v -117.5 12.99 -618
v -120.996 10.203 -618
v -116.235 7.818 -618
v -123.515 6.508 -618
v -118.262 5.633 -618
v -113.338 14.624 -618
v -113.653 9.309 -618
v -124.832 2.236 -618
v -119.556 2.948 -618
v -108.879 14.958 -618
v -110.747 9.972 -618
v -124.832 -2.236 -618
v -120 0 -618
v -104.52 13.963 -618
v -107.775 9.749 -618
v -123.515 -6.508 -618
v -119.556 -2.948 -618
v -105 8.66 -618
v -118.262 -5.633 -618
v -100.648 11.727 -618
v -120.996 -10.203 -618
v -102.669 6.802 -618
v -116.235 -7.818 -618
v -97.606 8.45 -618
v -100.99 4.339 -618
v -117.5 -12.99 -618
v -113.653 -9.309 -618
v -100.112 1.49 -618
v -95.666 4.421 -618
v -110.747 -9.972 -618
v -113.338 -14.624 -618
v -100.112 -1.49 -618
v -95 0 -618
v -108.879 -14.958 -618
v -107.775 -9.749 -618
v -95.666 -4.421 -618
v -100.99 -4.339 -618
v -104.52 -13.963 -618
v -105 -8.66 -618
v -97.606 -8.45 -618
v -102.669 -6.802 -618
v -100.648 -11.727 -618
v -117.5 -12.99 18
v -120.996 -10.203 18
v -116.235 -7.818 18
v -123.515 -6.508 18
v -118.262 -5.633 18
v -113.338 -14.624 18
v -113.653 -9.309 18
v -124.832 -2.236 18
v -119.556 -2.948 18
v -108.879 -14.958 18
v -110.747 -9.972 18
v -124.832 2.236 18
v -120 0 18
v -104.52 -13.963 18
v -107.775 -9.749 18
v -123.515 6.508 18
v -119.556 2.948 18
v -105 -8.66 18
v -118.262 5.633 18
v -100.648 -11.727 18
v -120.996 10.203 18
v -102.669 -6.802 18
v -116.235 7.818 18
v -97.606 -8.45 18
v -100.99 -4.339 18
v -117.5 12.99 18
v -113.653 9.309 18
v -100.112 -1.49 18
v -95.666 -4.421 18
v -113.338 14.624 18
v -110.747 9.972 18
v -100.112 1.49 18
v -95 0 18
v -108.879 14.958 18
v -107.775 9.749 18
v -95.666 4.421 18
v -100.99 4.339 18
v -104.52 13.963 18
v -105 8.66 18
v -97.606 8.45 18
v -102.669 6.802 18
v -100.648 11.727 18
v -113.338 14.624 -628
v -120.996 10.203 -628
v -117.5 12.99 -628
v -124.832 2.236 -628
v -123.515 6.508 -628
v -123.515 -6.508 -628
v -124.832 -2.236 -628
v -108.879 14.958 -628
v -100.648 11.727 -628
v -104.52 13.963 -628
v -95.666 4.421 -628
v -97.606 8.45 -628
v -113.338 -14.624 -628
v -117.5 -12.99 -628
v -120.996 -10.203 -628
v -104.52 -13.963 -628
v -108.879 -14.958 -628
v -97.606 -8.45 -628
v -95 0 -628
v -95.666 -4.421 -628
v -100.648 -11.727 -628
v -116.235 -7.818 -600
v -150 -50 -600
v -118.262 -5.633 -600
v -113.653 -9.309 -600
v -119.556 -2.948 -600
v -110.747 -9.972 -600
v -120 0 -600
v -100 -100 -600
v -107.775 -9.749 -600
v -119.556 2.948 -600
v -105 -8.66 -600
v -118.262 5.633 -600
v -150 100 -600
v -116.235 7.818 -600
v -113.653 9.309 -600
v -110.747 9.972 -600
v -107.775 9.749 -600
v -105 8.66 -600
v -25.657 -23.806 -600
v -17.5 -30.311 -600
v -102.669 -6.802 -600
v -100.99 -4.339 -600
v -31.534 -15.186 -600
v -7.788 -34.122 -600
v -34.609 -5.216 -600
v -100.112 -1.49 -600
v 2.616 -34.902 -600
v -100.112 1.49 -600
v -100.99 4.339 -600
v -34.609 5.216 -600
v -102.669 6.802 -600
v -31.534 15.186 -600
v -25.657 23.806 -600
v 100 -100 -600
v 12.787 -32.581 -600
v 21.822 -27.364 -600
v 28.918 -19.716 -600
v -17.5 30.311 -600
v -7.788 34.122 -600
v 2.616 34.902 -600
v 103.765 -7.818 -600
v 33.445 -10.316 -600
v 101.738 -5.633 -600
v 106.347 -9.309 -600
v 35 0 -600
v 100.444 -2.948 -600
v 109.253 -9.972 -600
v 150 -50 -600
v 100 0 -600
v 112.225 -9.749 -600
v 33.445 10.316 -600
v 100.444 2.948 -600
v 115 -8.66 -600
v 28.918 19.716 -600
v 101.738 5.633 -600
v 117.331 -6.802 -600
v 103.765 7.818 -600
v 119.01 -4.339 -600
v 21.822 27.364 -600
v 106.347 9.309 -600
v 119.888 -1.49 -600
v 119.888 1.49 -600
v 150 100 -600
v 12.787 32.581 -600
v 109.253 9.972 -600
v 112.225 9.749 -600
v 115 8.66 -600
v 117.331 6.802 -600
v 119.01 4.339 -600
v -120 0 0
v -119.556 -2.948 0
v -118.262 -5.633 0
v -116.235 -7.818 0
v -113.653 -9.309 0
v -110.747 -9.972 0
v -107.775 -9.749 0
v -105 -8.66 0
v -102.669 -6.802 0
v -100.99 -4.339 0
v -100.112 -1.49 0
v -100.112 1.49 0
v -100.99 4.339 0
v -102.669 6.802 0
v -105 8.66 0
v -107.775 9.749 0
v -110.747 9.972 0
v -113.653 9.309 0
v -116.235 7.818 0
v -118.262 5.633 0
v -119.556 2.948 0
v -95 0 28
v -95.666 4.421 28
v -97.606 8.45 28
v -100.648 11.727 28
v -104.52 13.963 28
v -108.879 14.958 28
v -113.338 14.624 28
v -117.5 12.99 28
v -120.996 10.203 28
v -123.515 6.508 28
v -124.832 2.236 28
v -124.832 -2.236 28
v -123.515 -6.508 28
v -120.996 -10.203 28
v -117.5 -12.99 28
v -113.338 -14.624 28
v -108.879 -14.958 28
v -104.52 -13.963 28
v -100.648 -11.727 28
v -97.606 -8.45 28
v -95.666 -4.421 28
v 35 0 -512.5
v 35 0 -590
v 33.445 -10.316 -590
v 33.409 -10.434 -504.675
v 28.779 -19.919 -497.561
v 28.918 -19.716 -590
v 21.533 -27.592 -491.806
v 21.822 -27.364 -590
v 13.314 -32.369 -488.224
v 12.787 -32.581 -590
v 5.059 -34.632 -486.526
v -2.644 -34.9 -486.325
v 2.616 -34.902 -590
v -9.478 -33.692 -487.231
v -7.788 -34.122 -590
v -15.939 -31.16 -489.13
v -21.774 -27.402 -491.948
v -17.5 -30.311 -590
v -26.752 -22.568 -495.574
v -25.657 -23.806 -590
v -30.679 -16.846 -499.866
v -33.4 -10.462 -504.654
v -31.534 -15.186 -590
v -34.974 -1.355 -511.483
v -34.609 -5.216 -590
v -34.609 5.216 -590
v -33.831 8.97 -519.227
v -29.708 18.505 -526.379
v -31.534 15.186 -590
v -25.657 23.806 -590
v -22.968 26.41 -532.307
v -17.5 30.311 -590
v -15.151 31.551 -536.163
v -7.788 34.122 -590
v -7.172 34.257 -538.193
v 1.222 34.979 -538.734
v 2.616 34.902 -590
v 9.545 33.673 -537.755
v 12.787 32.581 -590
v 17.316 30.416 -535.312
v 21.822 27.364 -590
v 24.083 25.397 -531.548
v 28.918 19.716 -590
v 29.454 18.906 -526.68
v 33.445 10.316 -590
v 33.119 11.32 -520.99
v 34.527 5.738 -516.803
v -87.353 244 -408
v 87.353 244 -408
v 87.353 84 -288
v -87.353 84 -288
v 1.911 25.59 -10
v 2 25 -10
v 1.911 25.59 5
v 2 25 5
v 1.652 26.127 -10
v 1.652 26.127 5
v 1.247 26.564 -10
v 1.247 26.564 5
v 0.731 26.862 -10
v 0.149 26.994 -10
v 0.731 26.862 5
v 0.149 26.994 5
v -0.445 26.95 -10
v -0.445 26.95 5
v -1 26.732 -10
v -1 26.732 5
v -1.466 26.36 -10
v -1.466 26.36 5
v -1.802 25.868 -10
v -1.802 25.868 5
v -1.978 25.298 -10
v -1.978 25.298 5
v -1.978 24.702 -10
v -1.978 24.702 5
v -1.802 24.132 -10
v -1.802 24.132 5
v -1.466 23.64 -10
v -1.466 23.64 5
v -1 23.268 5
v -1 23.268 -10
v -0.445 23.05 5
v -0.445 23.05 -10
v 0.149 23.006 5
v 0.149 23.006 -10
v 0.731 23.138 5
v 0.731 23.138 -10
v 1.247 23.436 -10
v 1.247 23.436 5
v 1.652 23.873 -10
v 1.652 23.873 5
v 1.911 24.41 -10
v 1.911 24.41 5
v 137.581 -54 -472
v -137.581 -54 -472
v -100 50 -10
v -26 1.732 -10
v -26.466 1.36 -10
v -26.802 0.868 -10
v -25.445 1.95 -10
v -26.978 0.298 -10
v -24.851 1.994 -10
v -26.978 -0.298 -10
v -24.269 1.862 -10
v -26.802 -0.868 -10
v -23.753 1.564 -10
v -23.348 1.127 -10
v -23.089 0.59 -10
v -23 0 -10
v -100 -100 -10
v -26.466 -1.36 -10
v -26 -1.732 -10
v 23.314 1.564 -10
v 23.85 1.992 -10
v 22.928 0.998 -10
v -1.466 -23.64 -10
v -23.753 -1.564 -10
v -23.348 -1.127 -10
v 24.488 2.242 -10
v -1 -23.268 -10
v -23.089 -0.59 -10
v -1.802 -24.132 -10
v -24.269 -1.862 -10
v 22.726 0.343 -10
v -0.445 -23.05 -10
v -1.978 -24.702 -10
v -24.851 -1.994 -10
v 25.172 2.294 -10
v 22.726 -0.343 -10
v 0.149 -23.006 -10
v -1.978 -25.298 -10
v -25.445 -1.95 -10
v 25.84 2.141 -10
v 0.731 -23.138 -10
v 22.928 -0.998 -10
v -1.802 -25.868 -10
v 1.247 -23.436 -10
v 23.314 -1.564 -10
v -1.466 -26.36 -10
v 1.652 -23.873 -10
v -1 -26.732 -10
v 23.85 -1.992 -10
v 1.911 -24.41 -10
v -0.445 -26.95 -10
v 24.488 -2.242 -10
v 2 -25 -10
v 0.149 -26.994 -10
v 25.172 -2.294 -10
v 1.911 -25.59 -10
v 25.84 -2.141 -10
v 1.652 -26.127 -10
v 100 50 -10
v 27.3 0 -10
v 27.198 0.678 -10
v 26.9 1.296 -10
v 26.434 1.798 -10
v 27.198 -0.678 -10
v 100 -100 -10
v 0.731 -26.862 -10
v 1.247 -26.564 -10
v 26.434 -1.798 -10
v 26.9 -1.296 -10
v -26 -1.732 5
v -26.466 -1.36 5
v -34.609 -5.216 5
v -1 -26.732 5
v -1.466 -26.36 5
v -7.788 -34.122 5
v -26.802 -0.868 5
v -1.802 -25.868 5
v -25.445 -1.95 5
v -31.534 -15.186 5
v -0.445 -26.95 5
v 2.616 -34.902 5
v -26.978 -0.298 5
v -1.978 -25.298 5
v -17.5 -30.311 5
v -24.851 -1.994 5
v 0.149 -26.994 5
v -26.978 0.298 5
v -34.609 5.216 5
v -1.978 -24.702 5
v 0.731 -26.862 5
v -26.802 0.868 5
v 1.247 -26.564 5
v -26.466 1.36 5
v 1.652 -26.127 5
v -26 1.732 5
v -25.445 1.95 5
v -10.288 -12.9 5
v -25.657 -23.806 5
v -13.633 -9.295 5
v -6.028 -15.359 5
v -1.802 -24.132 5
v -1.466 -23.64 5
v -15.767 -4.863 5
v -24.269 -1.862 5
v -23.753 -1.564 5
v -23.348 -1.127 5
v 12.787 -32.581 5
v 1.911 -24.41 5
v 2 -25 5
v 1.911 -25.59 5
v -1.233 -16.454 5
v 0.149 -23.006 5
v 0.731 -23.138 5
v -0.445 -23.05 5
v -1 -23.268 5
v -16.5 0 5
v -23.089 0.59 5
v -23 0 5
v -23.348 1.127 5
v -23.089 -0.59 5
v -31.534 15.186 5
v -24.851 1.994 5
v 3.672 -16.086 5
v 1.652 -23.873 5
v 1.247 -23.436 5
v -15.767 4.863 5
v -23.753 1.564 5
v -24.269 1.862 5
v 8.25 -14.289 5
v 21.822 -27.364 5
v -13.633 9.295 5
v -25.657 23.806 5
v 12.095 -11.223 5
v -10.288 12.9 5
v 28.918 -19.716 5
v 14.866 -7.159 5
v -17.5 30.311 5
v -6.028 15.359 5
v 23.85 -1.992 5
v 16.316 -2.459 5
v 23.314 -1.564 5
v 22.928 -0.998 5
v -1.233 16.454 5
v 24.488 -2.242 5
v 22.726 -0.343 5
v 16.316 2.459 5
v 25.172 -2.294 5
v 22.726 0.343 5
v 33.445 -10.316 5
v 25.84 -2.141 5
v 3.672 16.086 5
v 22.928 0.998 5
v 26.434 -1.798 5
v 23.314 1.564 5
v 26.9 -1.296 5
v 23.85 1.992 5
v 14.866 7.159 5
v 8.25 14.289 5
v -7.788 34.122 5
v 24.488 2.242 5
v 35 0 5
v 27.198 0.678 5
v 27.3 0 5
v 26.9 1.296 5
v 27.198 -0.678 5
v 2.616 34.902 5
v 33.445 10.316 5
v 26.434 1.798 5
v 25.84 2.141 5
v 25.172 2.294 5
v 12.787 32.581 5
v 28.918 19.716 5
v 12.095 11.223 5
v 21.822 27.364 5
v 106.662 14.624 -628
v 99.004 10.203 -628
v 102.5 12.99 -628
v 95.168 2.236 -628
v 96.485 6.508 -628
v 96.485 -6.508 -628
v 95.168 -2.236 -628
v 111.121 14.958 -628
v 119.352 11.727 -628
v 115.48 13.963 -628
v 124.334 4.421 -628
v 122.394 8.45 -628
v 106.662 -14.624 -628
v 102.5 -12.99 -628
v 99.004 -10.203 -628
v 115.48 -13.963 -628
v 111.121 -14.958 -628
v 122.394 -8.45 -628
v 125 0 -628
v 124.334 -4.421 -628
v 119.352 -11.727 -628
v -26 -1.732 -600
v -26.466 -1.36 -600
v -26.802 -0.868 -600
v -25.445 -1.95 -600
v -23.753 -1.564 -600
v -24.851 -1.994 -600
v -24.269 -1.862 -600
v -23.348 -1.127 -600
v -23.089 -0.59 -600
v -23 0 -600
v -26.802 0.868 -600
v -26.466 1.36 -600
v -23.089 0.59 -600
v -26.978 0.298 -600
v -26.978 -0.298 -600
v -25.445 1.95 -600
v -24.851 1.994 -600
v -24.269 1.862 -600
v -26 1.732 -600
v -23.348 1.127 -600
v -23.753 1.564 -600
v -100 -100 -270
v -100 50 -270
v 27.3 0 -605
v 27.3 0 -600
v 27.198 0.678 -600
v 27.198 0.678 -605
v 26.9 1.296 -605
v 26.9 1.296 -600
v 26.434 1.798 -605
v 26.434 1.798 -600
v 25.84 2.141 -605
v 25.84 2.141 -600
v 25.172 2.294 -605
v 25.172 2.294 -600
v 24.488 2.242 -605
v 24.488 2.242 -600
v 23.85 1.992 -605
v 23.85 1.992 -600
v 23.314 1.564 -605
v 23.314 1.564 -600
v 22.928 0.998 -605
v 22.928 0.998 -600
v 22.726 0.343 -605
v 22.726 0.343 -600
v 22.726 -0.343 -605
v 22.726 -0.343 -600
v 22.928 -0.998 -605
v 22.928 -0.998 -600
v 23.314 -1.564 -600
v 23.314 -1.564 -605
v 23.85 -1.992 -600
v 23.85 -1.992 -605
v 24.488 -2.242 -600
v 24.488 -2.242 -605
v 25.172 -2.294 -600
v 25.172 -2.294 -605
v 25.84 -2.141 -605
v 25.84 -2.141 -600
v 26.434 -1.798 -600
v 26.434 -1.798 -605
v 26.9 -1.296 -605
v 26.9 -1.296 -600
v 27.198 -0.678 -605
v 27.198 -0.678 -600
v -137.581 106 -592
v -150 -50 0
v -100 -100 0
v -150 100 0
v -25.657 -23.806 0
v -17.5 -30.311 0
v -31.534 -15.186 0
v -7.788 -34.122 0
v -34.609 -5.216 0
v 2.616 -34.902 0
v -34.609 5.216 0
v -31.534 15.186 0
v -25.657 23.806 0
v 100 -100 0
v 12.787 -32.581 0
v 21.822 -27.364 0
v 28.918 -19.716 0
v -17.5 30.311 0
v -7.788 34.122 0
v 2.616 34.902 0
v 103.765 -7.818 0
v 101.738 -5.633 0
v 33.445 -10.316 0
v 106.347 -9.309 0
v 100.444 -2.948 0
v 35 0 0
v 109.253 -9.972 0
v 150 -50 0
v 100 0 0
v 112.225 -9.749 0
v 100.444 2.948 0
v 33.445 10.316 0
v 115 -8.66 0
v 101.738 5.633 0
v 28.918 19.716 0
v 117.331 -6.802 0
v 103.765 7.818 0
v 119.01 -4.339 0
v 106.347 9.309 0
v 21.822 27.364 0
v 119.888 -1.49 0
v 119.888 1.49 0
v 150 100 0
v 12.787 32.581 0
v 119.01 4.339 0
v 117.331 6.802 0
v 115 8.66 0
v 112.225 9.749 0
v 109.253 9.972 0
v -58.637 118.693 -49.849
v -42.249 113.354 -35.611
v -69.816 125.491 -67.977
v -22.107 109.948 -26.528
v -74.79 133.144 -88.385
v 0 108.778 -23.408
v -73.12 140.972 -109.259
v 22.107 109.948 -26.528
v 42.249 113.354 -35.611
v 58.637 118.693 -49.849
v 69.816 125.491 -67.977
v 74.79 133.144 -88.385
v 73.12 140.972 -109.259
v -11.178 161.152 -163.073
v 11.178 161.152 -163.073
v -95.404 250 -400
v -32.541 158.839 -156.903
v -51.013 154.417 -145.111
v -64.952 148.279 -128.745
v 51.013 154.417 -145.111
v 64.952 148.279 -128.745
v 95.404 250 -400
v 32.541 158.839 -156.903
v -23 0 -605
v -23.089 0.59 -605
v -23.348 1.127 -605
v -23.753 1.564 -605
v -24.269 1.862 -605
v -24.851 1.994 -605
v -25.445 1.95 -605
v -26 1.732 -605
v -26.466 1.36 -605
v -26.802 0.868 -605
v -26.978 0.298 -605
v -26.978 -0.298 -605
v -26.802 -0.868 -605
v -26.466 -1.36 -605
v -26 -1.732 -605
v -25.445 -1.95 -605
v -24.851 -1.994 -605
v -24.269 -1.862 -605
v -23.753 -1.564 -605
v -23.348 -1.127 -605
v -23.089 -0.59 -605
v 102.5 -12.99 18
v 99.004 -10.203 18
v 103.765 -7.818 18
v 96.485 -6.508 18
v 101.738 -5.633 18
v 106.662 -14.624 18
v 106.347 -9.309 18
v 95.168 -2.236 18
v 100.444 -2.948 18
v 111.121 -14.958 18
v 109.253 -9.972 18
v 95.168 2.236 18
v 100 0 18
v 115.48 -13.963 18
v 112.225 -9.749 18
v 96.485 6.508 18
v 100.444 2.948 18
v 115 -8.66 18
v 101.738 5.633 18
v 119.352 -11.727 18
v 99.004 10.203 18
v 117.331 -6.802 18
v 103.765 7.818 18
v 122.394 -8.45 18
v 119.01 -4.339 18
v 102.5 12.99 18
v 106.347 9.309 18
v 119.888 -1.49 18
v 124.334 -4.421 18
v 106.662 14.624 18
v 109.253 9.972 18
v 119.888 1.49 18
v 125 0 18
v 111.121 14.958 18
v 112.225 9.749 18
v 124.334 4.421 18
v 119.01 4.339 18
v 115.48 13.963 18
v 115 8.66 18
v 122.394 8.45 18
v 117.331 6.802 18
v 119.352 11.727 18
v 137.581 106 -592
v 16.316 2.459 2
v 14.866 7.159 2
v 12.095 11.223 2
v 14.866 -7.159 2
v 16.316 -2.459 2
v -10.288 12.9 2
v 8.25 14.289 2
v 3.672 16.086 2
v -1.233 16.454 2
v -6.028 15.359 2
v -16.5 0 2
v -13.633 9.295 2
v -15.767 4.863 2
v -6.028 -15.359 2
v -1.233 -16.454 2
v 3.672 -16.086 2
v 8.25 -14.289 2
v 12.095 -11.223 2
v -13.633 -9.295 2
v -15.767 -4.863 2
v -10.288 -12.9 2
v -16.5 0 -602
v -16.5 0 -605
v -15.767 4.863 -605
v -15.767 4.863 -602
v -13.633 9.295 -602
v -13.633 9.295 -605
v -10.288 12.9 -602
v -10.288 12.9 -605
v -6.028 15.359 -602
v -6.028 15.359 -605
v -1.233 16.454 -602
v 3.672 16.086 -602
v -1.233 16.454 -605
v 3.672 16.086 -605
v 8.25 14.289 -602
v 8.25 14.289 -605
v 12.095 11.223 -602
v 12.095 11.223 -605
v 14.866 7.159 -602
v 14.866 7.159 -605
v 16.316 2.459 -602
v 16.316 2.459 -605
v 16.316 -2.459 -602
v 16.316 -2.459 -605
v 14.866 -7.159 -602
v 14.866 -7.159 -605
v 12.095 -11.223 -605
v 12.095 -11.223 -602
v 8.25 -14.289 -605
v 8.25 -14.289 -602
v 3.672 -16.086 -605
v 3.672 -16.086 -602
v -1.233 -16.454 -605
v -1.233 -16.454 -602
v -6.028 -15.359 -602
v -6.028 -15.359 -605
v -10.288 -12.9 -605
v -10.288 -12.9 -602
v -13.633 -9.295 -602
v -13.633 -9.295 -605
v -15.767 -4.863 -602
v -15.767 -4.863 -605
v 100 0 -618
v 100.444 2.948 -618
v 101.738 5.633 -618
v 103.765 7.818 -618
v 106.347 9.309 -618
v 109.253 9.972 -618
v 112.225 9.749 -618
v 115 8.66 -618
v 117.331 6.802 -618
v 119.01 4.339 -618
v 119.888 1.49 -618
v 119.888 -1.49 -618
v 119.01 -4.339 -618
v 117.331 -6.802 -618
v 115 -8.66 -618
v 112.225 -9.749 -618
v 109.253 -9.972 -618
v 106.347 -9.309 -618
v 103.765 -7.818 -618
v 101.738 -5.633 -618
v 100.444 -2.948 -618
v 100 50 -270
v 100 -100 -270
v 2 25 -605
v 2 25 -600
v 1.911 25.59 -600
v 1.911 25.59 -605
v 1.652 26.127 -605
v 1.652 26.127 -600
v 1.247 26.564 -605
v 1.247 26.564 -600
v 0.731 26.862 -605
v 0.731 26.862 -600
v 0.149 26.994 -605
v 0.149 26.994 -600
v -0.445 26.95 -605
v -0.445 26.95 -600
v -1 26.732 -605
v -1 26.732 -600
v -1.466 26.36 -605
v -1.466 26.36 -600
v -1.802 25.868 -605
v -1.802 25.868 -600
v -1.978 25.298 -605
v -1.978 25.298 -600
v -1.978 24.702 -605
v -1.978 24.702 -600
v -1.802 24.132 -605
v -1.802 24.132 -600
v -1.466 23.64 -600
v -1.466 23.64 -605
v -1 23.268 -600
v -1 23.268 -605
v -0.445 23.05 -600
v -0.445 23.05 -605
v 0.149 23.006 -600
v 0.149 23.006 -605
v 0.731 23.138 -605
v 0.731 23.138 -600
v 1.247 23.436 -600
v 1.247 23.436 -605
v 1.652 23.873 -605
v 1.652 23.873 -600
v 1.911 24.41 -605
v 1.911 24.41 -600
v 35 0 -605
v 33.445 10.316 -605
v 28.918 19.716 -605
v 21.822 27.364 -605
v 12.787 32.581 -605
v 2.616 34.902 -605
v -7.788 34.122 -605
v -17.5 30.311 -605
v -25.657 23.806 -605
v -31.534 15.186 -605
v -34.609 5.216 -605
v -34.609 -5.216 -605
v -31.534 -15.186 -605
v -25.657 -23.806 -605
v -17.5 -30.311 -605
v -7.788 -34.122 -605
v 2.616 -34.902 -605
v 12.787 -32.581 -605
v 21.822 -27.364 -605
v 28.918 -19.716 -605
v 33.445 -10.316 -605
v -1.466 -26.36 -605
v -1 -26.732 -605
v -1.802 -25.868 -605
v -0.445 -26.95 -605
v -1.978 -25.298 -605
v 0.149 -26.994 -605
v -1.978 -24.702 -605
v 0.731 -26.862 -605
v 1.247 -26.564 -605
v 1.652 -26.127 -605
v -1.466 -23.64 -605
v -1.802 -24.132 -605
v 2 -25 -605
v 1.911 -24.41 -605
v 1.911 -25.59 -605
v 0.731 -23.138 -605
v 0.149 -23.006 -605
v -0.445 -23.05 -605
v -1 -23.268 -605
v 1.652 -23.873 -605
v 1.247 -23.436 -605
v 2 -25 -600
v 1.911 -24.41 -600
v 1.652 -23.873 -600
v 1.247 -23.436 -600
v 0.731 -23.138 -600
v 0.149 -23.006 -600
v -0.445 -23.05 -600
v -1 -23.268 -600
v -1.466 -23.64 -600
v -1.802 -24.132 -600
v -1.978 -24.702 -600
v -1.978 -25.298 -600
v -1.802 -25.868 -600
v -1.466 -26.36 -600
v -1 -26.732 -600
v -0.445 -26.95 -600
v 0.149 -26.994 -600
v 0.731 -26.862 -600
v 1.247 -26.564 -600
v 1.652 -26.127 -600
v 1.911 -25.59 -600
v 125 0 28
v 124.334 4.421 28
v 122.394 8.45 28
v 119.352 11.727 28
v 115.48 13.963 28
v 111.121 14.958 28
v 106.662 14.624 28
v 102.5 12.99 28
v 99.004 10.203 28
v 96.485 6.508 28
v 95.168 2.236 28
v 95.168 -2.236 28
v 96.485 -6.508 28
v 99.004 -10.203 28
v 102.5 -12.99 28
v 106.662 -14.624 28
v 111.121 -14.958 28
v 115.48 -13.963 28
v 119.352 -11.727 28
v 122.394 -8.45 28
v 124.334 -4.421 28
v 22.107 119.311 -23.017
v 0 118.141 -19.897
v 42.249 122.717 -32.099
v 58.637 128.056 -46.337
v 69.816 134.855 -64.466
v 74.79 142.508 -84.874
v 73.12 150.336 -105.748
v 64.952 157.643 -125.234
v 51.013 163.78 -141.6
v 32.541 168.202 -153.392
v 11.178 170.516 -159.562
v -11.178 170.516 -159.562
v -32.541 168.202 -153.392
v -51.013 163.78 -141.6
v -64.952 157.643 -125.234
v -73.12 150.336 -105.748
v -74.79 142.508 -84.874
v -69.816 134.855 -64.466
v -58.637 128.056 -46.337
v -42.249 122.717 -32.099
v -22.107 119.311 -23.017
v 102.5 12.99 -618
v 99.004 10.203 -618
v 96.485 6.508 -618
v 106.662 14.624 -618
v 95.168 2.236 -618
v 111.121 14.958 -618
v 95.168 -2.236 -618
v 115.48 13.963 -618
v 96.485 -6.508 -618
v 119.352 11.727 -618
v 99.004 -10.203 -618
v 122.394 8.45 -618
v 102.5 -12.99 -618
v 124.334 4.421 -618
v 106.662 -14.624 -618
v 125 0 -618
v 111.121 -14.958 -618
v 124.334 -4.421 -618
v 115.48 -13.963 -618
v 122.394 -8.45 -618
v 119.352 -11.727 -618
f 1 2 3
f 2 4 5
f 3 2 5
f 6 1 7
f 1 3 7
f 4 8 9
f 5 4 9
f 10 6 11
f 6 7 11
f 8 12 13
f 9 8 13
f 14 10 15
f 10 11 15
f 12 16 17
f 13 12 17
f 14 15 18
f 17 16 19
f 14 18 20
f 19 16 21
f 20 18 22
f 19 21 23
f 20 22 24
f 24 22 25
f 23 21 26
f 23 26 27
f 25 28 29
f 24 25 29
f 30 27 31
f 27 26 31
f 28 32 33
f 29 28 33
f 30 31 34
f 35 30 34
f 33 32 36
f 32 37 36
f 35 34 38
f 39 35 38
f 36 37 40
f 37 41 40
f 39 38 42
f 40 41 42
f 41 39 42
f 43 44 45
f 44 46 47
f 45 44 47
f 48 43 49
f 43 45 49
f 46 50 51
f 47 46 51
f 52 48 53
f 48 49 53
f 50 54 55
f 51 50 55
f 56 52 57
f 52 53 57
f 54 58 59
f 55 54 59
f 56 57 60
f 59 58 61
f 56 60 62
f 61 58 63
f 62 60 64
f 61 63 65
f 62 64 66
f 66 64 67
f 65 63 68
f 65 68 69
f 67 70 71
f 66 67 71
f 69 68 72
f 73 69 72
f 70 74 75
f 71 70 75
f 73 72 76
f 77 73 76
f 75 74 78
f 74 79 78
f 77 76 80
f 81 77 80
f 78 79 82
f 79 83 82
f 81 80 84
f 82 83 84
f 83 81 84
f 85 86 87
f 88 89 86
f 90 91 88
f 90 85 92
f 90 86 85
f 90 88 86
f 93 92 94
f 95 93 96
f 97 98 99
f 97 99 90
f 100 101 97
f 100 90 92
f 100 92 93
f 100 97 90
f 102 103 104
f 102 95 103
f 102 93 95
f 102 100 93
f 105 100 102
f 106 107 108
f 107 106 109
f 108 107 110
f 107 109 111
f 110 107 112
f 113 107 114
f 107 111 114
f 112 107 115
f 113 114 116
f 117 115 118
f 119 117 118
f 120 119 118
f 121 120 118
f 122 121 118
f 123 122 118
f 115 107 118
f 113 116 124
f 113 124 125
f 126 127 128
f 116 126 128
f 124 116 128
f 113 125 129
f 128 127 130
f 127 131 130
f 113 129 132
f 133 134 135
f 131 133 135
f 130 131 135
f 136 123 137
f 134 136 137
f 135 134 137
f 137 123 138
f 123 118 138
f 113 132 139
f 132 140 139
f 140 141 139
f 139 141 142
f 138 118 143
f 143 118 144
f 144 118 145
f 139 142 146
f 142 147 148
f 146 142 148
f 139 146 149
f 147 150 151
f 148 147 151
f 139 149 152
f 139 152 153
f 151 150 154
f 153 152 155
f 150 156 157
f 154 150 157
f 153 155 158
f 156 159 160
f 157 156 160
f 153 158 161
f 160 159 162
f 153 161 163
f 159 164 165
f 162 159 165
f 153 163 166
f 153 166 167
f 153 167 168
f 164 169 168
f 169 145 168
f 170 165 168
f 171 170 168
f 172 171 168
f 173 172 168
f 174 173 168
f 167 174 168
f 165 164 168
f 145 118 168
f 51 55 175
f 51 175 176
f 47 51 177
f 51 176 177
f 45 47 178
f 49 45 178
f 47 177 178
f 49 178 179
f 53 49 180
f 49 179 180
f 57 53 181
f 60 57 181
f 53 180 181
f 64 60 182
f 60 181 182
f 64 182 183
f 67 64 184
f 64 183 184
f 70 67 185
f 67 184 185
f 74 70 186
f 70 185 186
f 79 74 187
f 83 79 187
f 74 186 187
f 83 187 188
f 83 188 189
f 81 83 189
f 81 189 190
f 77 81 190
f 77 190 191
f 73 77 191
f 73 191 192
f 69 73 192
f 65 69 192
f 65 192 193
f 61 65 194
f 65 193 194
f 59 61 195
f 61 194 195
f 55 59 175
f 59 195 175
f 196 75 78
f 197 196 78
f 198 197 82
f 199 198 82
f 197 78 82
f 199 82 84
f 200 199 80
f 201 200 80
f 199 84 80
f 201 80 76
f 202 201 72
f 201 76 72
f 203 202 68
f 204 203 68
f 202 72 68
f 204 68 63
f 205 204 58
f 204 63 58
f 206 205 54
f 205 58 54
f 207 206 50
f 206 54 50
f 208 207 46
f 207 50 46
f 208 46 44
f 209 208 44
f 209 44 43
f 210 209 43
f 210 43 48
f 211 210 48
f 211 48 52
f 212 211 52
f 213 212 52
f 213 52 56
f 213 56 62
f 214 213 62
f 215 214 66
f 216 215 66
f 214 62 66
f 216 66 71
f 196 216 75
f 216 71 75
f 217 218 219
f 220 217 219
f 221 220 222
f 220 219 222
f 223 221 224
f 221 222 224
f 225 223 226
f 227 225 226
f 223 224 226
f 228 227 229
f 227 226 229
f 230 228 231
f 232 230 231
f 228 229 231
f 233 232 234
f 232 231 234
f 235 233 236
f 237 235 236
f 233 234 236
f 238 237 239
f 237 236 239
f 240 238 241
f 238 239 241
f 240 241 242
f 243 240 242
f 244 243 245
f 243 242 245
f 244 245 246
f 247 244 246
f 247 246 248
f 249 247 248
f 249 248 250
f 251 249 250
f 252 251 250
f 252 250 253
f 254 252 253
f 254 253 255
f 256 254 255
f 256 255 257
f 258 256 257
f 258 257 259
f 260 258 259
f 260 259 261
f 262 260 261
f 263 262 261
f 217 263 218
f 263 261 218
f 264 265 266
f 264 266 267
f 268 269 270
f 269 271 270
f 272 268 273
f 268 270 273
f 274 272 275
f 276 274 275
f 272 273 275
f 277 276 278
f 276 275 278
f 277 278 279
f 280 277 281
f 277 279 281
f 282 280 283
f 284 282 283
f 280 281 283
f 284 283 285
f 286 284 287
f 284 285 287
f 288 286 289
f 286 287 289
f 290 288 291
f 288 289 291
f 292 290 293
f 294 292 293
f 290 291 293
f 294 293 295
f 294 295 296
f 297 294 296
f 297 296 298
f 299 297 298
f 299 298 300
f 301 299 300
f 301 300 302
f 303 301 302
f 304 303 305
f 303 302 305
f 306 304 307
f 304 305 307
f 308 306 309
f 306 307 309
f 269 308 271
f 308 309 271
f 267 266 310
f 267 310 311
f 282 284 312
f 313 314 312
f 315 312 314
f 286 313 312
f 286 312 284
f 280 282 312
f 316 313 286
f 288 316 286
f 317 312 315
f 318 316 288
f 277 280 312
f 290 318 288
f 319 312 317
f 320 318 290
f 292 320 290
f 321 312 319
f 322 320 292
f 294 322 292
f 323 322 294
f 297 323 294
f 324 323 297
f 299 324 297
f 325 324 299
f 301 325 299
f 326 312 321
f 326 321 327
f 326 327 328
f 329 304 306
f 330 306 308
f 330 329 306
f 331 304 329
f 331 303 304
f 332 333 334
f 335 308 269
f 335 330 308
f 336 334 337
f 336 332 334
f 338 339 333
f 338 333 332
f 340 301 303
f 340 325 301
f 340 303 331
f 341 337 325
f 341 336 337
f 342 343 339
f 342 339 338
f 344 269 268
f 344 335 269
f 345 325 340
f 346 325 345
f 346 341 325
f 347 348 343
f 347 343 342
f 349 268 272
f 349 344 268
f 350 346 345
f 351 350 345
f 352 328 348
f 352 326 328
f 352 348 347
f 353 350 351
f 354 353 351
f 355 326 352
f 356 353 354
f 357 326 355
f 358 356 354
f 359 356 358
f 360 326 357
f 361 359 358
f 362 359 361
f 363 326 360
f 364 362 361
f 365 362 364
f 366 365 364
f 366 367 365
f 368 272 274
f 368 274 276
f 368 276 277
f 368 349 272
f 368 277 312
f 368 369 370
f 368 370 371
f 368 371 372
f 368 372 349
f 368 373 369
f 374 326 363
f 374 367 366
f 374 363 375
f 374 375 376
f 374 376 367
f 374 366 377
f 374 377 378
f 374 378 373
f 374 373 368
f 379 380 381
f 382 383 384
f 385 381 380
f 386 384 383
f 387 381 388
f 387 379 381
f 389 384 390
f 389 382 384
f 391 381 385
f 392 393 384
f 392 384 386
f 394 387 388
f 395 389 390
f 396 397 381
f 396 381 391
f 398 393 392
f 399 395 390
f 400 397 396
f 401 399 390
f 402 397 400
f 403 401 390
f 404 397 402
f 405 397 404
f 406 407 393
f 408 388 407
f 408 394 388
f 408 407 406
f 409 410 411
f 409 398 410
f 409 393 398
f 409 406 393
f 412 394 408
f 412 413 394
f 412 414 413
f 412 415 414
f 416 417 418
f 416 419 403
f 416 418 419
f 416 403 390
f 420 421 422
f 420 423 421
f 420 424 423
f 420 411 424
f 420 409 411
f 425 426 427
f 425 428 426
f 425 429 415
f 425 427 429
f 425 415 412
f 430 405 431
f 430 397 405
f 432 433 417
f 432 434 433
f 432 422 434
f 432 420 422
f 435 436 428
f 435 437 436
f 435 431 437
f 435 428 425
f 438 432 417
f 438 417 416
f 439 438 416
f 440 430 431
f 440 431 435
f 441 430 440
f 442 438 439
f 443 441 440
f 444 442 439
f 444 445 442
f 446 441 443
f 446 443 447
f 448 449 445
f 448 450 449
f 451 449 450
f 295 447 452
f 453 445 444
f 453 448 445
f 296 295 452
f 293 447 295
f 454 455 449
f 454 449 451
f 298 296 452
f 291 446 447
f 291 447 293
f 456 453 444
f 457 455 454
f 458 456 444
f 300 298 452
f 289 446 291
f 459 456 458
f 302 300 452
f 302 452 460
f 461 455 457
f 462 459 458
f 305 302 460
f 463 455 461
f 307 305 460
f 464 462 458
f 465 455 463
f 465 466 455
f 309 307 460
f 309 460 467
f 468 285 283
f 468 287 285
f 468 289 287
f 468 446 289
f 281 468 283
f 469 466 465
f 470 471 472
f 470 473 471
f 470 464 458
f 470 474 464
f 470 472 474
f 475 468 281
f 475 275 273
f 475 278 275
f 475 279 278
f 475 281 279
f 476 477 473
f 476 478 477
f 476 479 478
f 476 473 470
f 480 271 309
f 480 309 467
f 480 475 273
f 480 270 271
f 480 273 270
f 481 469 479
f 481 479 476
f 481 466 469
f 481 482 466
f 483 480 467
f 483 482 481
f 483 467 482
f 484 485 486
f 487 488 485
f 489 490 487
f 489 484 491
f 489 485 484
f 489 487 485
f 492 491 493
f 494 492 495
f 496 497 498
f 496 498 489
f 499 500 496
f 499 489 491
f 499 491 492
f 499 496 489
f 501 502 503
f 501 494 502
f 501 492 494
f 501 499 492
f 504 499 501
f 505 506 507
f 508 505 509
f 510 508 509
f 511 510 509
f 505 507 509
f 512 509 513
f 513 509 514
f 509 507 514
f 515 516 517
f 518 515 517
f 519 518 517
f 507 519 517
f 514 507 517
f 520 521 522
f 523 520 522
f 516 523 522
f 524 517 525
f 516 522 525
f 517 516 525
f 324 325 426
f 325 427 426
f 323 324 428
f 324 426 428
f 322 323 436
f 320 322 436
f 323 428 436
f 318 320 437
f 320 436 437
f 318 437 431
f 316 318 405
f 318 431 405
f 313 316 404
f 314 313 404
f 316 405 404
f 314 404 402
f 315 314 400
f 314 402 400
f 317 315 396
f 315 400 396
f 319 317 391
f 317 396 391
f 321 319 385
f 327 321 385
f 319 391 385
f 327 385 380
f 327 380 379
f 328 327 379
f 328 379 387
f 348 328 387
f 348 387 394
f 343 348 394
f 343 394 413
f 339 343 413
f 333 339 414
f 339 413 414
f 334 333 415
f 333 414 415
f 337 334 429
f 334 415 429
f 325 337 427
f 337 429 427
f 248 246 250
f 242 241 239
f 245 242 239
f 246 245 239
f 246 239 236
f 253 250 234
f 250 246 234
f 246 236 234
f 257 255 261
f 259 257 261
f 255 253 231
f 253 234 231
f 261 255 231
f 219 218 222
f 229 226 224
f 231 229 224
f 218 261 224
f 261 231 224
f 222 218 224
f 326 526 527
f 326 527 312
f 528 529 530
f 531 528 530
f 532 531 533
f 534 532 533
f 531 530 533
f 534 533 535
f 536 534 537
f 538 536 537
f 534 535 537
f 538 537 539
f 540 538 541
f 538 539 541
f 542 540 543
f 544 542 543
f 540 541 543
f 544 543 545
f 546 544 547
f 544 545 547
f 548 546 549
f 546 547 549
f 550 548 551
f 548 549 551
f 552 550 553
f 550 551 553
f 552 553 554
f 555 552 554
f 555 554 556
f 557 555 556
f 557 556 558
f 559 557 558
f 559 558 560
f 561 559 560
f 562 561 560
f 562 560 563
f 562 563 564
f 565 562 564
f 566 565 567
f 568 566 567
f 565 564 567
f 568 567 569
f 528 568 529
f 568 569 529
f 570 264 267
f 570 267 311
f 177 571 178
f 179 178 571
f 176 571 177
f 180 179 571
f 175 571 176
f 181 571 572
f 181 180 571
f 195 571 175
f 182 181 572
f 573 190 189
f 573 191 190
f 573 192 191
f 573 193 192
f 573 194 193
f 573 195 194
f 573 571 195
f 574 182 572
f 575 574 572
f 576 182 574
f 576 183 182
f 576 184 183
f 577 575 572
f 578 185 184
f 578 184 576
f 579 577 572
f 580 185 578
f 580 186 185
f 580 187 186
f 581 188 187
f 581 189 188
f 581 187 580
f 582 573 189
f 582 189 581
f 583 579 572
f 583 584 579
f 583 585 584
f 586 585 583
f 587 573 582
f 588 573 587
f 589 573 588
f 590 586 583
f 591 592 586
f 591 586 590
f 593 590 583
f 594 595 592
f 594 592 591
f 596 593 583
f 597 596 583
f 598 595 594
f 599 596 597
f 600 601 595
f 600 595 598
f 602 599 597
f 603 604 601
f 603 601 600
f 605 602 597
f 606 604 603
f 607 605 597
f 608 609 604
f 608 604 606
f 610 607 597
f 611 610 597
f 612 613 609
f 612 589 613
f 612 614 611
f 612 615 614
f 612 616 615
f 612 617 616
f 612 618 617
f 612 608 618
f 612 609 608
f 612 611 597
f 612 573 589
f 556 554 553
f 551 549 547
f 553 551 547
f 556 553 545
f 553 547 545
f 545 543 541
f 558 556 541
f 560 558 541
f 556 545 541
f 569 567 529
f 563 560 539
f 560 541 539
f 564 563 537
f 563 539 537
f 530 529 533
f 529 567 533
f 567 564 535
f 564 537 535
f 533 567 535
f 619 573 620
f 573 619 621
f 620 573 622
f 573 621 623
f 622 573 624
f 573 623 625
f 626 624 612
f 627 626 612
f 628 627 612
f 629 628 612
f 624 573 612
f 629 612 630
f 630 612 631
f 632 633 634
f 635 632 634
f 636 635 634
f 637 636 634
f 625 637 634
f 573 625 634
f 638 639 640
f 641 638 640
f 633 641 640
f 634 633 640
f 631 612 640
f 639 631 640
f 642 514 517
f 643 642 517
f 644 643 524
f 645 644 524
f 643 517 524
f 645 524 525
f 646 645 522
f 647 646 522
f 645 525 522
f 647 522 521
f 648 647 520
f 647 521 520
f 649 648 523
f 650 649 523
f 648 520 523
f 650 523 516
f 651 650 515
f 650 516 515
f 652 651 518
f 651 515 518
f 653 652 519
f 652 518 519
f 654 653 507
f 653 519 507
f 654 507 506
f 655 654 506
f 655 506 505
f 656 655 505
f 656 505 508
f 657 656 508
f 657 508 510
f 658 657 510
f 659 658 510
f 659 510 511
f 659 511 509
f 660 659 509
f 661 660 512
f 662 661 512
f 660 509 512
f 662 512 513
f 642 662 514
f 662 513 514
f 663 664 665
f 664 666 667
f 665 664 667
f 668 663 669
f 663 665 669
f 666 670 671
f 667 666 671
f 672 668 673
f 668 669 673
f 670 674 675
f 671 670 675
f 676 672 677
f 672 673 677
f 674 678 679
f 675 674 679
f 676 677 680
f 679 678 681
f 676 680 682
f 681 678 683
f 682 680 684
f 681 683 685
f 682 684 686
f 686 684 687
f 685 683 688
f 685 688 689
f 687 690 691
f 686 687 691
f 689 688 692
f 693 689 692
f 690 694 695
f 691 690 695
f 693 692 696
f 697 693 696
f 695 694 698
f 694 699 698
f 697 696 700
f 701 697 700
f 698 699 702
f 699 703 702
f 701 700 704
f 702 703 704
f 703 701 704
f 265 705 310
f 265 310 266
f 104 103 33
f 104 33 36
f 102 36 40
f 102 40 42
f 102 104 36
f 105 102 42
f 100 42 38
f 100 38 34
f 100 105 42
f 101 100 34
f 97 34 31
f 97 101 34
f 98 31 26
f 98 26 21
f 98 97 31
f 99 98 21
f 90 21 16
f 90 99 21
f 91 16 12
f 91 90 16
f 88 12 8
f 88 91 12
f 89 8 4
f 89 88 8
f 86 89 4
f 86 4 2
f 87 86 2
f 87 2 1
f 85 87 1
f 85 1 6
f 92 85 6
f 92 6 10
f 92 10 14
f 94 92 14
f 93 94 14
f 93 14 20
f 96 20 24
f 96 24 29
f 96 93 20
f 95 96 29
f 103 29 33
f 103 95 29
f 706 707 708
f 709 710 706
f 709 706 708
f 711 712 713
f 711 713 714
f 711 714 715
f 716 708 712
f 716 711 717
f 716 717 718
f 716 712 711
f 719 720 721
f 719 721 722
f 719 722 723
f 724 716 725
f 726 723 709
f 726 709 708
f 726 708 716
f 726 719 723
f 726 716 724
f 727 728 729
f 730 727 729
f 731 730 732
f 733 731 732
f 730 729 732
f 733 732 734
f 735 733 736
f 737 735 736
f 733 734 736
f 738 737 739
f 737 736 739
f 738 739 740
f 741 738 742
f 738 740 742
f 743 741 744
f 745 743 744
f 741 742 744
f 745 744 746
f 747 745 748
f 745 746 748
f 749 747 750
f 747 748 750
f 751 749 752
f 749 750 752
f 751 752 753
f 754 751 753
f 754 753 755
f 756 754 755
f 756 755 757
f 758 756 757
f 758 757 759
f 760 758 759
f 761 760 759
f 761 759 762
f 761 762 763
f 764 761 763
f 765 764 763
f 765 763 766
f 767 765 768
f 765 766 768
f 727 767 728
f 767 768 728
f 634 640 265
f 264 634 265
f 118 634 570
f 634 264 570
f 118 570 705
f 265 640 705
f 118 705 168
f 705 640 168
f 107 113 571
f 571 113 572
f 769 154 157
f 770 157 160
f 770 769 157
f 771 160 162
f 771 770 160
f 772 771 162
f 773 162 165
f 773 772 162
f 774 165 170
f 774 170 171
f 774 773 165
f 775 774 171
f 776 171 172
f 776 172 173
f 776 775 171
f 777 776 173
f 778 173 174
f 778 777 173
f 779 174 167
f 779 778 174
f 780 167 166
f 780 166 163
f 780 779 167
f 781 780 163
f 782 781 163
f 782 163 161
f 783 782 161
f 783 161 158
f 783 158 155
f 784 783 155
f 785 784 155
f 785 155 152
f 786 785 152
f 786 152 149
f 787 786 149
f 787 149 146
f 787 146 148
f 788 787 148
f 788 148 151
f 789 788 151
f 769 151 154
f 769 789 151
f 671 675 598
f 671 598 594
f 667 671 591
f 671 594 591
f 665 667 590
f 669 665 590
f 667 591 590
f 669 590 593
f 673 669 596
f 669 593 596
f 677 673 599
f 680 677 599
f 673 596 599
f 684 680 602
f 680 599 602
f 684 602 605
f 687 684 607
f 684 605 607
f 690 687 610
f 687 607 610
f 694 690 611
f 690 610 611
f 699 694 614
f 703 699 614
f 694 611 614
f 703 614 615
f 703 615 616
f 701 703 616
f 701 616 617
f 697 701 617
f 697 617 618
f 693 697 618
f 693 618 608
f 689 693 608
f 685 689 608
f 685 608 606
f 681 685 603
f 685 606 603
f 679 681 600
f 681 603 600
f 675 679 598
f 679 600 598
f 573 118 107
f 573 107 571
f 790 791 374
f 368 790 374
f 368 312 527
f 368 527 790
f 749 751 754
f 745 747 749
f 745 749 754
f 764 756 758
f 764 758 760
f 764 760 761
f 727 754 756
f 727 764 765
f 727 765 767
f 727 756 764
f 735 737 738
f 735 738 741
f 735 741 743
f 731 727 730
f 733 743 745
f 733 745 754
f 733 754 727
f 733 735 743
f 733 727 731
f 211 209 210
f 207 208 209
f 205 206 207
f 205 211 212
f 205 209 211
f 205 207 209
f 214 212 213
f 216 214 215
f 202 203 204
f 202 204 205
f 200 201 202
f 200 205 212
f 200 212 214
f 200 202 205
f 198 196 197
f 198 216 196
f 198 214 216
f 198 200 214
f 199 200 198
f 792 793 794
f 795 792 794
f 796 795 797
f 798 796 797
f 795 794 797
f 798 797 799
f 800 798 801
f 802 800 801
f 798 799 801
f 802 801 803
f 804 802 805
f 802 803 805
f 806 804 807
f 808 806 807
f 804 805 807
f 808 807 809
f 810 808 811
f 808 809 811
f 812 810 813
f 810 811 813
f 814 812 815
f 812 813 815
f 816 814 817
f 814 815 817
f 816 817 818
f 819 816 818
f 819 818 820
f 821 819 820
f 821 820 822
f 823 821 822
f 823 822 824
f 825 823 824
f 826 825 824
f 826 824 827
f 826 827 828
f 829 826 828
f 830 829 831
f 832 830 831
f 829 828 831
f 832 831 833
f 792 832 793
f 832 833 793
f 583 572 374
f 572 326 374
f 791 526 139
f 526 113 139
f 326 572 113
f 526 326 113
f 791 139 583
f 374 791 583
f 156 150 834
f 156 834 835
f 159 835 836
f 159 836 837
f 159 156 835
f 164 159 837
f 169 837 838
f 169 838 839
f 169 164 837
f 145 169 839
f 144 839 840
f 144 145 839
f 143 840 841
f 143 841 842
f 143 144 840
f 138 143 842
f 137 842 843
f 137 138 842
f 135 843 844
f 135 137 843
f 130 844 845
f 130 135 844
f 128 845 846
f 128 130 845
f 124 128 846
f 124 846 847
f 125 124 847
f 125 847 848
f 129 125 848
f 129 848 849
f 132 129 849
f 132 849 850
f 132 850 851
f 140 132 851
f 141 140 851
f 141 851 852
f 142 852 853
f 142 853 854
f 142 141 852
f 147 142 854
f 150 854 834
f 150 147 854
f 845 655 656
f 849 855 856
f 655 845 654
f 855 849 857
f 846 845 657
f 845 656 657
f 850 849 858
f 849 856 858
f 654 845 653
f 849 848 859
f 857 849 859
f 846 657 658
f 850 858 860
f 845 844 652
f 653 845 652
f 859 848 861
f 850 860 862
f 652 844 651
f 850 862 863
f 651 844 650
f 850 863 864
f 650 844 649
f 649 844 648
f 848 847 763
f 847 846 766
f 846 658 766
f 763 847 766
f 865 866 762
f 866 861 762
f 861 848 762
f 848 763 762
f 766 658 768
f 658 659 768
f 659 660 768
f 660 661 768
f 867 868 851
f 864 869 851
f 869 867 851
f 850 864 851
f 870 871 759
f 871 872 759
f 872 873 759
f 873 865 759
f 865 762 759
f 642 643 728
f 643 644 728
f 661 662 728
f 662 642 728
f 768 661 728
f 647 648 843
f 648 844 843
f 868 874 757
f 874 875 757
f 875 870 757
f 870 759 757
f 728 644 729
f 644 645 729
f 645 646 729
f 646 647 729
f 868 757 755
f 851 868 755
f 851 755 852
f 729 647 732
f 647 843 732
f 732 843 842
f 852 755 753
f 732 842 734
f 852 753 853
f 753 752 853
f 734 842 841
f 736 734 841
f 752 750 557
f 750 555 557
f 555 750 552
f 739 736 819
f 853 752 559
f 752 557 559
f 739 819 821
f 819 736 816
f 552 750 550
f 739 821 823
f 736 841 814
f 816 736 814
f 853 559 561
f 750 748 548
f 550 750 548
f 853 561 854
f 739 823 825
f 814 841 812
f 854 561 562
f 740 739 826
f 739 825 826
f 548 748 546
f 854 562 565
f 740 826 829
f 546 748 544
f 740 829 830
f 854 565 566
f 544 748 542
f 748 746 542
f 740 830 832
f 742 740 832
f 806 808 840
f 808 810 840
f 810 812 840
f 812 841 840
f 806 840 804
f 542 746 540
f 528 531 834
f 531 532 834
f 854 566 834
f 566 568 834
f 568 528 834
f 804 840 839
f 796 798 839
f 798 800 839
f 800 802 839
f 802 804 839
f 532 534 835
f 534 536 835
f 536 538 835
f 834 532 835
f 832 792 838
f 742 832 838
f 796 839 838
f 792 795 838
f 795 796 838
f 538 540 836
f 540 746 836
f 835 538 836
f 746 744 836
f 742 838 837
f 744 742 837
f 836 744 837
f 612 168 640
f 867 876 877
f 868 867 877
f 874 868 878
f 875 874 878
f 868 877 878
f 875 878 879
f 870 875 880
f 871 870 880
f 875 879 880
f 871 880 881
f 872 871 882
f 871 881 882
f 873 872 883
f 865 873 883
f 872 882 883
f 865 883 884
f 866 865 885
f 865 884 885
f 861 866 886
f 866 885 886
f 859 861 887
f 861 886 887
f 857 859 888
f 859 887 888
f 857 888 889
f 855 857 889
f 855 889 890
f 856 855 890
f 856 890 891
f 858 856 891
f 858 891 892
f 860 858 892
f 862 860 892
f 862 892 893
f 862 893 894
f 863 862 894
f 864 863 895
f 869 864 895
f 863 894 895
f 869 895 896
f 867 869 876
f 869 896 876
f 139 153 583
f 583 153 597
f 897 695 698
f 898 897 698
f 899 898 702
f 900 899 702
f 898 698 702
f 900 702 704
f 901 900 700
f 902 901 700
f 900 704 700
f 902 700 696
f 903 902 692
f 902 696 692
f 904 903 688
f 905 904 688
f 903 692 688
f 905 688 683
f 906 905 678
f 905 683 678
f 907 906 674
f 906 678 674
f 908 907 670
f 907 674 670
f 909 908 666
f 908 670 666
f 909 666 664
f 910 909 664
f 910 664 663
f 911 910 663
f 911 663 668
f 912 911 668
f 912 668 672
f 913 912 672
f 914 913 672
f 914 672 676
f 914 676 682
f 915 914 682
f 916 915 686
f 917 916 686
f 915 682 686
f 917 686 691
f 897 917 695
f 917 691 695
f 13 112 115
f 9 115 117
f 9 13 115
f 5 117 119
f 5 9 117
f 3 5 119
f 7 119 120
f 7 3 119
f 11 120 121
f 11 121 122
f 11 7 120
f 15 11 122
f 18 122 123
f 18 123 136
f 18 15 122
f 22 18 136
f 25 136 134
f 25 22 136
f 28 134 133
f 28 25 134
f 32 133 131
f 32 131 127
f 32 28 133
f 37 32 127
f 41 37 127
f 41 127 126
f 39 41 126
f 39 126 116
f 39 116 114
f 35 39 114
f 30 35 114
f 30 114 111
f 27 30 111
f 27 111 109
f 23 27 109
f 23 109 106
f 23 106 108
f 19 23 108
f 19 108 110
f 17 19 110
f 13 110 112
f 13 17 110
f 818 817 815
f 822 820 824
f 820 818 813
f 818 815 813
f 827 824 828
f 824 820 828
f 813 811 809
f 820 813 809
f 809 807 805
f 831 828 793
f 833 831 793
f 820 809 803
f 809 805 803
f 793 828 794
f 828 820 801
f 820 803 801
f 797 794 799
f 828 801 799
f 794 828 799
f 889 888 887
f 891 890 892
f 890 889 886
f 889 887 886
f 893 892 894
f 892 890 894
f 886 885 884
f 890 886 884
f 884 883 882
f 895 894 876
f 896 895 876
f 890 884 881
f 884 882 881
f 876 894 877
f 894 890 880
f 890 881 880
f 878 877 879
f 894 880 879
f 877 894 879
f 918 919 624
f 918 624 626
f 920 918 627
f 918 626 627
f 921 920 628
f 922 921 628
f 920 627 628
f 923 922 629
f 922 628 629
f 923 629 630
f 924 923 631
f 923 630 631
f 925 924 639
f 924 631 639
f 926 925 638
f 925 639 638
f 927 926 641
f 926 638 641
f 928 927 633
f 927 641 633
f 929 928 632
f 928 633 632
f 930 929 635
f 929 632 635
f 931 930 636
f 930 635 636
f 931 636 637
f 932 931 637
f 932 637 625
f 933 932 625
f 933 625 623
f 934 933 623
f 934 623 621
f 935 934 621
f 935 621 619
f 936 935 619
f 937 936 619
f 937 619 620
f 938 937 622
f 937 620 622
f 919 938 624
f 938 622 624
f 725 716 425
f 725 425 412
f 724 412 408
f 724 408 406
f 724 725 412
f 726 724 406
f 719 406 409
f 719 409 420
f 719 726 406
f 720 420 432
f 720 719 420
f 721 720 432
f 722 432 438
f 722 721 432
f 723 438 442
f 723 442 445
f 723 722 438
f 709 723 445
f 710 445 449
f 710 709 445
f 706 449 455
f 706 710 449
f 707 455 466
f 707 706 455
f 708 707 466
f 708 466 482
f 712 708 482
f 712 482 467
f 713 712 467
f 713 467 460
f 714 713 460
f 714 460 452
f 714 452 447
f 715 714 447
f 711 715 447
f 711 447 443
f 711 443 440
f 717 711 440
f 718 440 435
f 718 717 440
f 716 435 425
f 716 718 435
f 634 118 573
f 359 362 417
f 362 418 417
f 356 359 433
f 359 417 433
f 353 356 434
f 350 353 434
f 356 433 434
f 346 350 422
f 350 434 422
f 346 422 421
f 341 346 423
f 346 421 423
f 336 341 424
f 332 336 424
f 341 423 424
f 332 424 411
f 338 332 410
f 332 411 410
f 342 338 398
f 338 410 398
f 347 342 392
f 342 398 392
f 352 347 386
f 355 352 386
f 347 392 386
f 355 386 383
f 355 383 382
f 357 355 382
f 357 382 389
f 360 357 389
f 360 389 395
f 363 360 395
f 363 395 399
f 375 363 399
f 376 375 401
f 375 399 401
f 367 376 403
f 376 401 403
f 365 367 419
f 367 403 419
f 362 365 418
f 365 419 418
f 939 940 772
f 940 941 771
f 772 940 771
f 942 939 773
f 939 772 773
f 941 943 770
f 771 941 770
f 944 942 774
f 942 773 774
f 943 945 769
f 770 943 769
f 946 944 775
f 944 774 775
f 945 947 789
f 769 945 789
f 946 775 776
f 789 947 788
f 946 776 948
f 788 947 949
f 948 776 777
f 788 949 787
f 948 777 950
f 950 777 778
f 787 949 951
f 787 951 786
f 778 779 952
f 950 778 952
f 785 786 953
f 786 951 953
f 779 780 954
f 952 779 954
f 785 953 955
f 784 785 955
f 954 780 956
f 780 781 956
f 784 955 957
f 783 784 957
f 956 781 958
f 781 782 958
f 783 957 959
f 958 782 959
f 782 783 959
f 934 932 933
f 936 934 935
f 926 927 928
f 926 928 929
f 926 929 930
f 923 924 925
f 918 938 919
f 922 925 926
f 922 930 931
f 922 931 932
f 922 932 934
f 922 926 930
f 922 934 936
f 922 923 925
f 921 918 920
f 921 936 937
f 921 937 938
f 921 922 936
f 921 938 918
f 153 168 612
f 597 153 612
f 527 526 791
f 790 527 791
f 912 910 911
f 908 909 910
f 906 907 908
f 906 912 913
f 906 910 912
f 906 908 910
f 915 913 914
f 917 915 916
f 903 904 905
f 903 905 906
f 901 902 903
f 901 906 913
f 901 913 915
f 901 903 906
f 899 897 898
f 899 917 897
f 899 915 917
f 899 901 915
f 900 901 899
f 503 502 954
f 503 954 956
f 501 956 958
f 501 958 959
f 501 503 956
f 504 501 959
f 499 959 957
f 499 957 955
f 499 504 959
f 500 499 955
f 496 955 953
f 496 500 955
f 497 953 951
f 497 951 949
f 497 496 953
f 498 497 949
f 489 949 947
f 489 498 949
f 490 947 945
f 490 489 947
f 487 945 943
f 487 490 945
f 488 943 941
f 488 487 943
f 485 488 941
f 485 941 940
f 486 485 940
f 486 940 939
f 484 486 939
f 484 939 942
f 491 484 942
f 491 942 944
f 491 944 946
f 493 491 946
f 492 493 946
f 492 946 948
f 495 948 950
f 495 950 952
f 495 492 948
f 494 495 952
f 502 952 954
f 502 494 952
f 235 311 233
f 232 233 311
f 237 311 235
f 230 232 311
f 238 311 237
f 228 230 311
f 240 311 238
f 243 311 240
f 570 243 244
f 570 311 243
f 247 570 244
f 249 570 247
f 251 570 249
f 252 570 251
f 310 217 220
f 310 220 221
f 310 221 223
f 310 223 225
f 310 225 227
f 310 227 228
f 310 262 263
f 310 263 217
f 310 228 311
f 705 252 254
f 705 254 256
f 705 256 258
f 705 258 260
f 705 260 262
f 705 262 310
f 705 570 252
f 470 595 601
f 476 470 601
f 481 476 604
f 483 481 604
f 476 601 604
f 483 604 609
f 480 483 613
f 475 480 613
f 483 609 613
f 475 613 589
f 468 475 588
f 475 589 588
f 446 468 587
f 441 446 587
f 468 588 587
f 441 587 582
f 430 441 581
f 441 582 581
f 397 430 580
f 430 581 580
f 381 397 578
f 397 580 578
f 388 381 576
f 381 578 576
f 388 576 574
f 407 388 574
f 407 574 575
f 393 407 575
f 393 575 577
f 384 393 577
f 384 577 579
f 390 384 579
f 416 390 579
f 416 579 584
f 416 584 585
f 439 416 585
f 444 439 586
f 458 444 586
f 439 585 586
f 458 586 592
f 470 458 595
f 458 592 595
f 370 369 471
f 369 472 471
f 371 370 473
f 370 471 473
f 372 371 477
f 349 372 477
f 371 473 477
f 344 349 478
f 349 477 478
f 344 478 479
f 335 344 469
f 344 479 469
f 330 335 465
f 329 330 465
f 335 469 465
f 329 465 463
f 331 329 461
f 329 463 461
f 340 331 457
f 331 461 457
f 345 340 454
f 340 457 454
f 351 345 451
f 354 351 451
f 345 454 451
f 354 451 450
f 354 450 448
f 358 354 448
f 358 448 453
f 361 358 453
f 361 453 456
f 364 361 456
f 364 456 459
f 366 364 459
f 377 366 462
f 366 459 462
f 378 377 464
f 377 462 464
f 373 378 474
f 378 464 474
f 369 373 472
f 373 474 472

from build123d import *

# Parameters (mm, degrees)
SKETCH3_W            = 300
SKETCH3_H            = 200
BOSS_EXTRUDE2_DEPTH  = 300
SKETCH8_R            = 35
SKETCH8_R_2          = 2
SKETCH8_R_3          = 2.3
BOSS_EXTRUDE7_DEPTH  = 5
BOSS_EXTRUDE8_DEPTH  = 300
SKETCH19_W           = 200
SKETCH19_H           = 260
CUT_EXTRUDE5_DEPTH   = 150
CUT_EXTRUDE3_REACH   = 673.584
CUT_EXTRUDE4_DEPTH   = 200
CHAMFER2_SIZE        = 50
SKETCH4_R            = 10
BOSS_EXTRUDE9_DEPTH  = 18
SKETCH15_R           = 15
BOSS_EXTRUDE10_DEPTH = 10
BOSS_EXTRUDE11_START = 18
SKETCH16_R           = 10
BOSS_EXTRUDE11_DEPTH = 18
BOSS_EXTRUDE12_START = 10
SKETCH17_R           = 15
BOSS_EXTRUDE12_DEPTH = 10
SKETCH18_R           = 75
BOSS_EXTRUDE13_DEPTH = 10
CUT_EXTRUDE6_REACH   = 685.318
SKETCH20_R           = 35
SKETCH21_R           = 16.5
CUT_EXTRUDE7_DEPTH   = 3
CUT_EXTRUDE8_START   = -3
SKETCH22_R           = 16.5
CUT_EXTRUDE8_DEPTH   = 3
SKETCH23_R           = 2
SKETCH23_R_2         = 2.3
CUT_EXTRUDE9_DEPTH   = 20


with BuildPart() as part:
    # Sketch3 → Boss-Extrude2 (new body)
    with BuildSketch(Plane.XY):
        Rectangle(SKETCH3_W, SKETCH3_H)
    extrude(amount=-BOSS_EXTRUDE2_DEPTH)

    # Sketch8 → Boss-Extrude7 (add)
    with BuildSketch(Plane.XY):
        Circle(SKETCH8_R)
        with Locations((0, 25)):
            Circle(SKETCH8_R_2, mode=Mode.SUBTRACT)
        with Locations((0, -25)):
            Circle(SKETCH8_R_2, mode=Mode.SUBTRACT)
        with Locations((25, 0)):
            Circle(SKETCH8_R_3, mode=Mode.SUBTRACT)
        with Locations((-25, 0)):
            Circle(SKETCH8_R_2, mode=Mode.SUBTRACT)
    extrude(amount=BOSS_EXTRUDE7_DEPTH)

    # Mirror1: part across plane


with BuildPart() as part_1:
    add(part.part)
    add(part.part.mirror(Plane(origin=(0, 0, -300), x_dir=(1, 0, 0), z_dir=(0, 0, -1))))

    # Sketch10 → Boss-Extrude8 (add)
    with BuildSketch(Plane(origin=(150, 0, 0), x_dir=(0, 0, -1), z_dir=(1, 0, 0))):
        Polygon((0, 100), (400, 250), (600, 100), align=None)
    extrude(amount=-BOSS_EXTRUDE8_DEPTH)

    # Sketch19 → Cut-Extrude5 (cut)
    with BuildSketch(Plane.XZ.offset(100)):
        with Locations((0, -140)):
            Rectangle(SKETCH19_W, SKETCH19_H)
    extrude(amount=-CUT_EXTRUDE5_DEPTH, mode=Mode.SUBTRACT)

    # Cut-Extrude3: up to this plane
    cut_extrude3_end = Plane(origin=(-768.465843843, 250, -400), z_dir=(0, 0.7999999999999999, -0.6000000000000001))
    # Sketch11 → Cut-Extrude3 (cut, up to the surface)
    with BuildSketch(Plane.XY, mode=Mode.PRIVATE) as cut_extrude3_sk1:
        Polygon((150, 100), (95.40446486, 250), (150, 250), align=None)
    cut_extrude3_tool1 = split(extrude(cut_extrude3_sk1.sketch, amount=-CUT_EXTRUDE3_REACH, mode=Mode.PRIVATE), bisect_by=cut_extrude3_end, keep=Keep.BOTH, mode=Mode.PRIVATE)
    add(cut_extrude3_tool1.solids().sort_by_distance((131.801488, 200, 0))[0], mode=Mode.SUBTRACT)
    # Sketch11 → Cut-Extrude3 (cut, up to the surface)
    with BuildSketch(Plane.XY, mode=Mode.PRIVATE) as cut_extrude3_sk2:
        Polygon((-150, 100), (-95.40446486, 250), (-150, 250), align=None)
    cut_extrude3_tool2 = split(extrude(cut_extrude3_sk2.sketch, amount=-CUT_EXTRUDE3_REACH, mode=Mode.PRIVATE), bisect_by=cut_extrude3_end, keep=Keep.BOTH, mode=Mode.PRIVATE)
    add(cut_extrude3_tool2.solids().sort_by_distance((-131.801488, 200, 0))[0], mode=Mode.SUBTRACT)

    # Sketch14 → Cut-Extrude4 (cut)
    with BuildSketch(Plane(origin=(0, 352, -264), x_dir=(1, 0, 0), z_dir=(0, 0.7999999999999999, -0.6000000000000002))):
        Polygon((-137.580501971, 410), (137.580501971, 410), (87.352609643, 180), (-87.352609643, 180), align=None)
    extrude(amount=-CUT_EXTRUDE4_DEPTH, mode=Mode.SUBTRACT)

    # Chamfer2
    chamfer2_edges = [part_1.edges().sort_by_distance(p)[0] for p in [
        (150, -100, -300),
        (-150, -100, -300),
    ]]
    chamfer(chamfer2_edges, length=CHAMFER2_SIZE - 0.0001)  # a hair under: the kernel refuses the full size

    # Sketch4 → Boss-Extrude9 (add)
    with BuildSketch(Plane.XY):
        with Locations(Location((-110, 0, 0), (0, 0, 180))):
            Circle(SKETCH4_R)
        with Locations(Location((110, 0, 0), (0, 0, 180))):
            Circle(SKETCH4_R)
    extrude(amount=BOSS_EXTRUDE9_DEPTH)

    # Sketch15 → Boss-Extrude10 (add)
    with BuildSketch(Plane.XY.offset(18)):
        with Locations((-110, 0)):
            Circle(SKETCH15_R)
        with Locations((110, 0)):
            Circle(SKETCH15_R)
    extrude(amount=BOSS_EXTRUDE10_DEPTH)

    # Sketch16 → Boss-Extrude11 (add)
    with BuildSketch(Plane(origin=(0, 0, -600), x_dir=(-1, 0, 0), z_dir=(0, 0, -1)).offset(BOSS_EXTRUDE11_START)):
        with Locations((110, 0)):
            Circle(SKETCH16_R)
        with Locations((-110, 0)):
            Circle(SKETCH16_R)
    extrude(amount=-BOSS_EXTRUDE11_DEPTH)

    # Sketch17 → Boss-Extrude12 (add)
    with BuildSketch(Plane(origin=(0, 0, -618), x_dir=(-1, 0, 0), z_dir=(0, 0, -1)).offset(BOSS_EXTRUDE12_START)):
        with Locations(Location((-110, 0, 0), (0, 0, 180))):
            Circle(SKETCH17_R)
        with Locations(Location((110, 0, 0), (0, 0, 180))):
            Circle(SKETCH17_R)
    extrude(amount=-BOSS_EXTRUDE12_DEPTH)

    # Sketch18 → Boss-Extrude13 (add)
    with BuildSketch(Plane(origin=(0, 87.671232877, 32.876712329), x_dir=(1, 0, 0), z_dir=(0, 0.9363291775690445, 0.35112344158839187))):
        with Locations(Location((0, 135.112344159, 0), (0, 0, 270))):
            Circle(SKETCH18_R)
    extrude(amount=BOSS_EXTRUDE13_DEPTH)

    # Cut-Extrude6: up to this plane
    cut_extrude6_end = Plane(origin=(-137.580501971, -54, -472), z_dir=(0, -0.6000000000000002, -0.7999999999999999))
    # Sketch20 → Cut-Extrude6 (cut, up to the surface)
    with BuildSketch(Plane(origin=(0, 0, -590), x_dir=(-1, 0, 0), z_dir=(0, 0, -1)), mode=Mode.PRIVATE) as cut_extrude6_sk1:
        with Locations(Location((0, 0, 0), (0, 0, 180))):
            Circle(SKETCH20_R)
    cut_extrude6_tool1 = split(extrude(cut_extrude6_sk1.sketch, amount=-CUT_EXTRUDE6_REACH, mode=Mode.PRIVATE), bisect_by=cut_extrude6_end, keep=Keep.BOTH, mode=Mode.PRIVATE)
    add(cut_extrude6_tool1.solids().sort_by_distance((0, 0, -590))[0], mode=Mode.SUBTRACT)

    # Sketch21 → Cut-Extrude7 (cut)
    with BuildSketch(Plane(origin=(0, 0, -605), x_dir=(-1, 0, 0), z_dir=(0, 0, -1))):
        Circle(SKETCH21_R)
    extrude(amount=-CUT_EXTRUDE7_DEPTH, mode=Mode.SUBTRACT)

    # Sketch22 → Cut-Extrude8 (cut)
    with BuildSketch(Plane.XY.offset(5).offset(CUT_EXTRUDE8_START)):
        with Locations(Location((0, 0, 0), (0, 0, 180))):
            Circle(SKETCH22_R)
    extrude(amount=CUT_EXTRUDE8_DEPTH, mode=Mode.SUBTRACT)

    # Sketch23 → Cut-Extrude9 (cut)
    with BuildSketch(Plane.XY.offset(5)):
        with Locations((0, 25)):
            Circle(SKETCH23_R)
        with Locations((25, 0)):
            Circle(SKETCH23_R_2)
        with Locations((0, -25)):
            Circle(SKETCH23_R)
        with Locations((-25, 0)):
            Circle(SKETCH23_R)
    extrude(amount=-CUT_EXTRUDE9_DEPTH, mode=Mode.SUBTRACT)


solid = part_1.part
